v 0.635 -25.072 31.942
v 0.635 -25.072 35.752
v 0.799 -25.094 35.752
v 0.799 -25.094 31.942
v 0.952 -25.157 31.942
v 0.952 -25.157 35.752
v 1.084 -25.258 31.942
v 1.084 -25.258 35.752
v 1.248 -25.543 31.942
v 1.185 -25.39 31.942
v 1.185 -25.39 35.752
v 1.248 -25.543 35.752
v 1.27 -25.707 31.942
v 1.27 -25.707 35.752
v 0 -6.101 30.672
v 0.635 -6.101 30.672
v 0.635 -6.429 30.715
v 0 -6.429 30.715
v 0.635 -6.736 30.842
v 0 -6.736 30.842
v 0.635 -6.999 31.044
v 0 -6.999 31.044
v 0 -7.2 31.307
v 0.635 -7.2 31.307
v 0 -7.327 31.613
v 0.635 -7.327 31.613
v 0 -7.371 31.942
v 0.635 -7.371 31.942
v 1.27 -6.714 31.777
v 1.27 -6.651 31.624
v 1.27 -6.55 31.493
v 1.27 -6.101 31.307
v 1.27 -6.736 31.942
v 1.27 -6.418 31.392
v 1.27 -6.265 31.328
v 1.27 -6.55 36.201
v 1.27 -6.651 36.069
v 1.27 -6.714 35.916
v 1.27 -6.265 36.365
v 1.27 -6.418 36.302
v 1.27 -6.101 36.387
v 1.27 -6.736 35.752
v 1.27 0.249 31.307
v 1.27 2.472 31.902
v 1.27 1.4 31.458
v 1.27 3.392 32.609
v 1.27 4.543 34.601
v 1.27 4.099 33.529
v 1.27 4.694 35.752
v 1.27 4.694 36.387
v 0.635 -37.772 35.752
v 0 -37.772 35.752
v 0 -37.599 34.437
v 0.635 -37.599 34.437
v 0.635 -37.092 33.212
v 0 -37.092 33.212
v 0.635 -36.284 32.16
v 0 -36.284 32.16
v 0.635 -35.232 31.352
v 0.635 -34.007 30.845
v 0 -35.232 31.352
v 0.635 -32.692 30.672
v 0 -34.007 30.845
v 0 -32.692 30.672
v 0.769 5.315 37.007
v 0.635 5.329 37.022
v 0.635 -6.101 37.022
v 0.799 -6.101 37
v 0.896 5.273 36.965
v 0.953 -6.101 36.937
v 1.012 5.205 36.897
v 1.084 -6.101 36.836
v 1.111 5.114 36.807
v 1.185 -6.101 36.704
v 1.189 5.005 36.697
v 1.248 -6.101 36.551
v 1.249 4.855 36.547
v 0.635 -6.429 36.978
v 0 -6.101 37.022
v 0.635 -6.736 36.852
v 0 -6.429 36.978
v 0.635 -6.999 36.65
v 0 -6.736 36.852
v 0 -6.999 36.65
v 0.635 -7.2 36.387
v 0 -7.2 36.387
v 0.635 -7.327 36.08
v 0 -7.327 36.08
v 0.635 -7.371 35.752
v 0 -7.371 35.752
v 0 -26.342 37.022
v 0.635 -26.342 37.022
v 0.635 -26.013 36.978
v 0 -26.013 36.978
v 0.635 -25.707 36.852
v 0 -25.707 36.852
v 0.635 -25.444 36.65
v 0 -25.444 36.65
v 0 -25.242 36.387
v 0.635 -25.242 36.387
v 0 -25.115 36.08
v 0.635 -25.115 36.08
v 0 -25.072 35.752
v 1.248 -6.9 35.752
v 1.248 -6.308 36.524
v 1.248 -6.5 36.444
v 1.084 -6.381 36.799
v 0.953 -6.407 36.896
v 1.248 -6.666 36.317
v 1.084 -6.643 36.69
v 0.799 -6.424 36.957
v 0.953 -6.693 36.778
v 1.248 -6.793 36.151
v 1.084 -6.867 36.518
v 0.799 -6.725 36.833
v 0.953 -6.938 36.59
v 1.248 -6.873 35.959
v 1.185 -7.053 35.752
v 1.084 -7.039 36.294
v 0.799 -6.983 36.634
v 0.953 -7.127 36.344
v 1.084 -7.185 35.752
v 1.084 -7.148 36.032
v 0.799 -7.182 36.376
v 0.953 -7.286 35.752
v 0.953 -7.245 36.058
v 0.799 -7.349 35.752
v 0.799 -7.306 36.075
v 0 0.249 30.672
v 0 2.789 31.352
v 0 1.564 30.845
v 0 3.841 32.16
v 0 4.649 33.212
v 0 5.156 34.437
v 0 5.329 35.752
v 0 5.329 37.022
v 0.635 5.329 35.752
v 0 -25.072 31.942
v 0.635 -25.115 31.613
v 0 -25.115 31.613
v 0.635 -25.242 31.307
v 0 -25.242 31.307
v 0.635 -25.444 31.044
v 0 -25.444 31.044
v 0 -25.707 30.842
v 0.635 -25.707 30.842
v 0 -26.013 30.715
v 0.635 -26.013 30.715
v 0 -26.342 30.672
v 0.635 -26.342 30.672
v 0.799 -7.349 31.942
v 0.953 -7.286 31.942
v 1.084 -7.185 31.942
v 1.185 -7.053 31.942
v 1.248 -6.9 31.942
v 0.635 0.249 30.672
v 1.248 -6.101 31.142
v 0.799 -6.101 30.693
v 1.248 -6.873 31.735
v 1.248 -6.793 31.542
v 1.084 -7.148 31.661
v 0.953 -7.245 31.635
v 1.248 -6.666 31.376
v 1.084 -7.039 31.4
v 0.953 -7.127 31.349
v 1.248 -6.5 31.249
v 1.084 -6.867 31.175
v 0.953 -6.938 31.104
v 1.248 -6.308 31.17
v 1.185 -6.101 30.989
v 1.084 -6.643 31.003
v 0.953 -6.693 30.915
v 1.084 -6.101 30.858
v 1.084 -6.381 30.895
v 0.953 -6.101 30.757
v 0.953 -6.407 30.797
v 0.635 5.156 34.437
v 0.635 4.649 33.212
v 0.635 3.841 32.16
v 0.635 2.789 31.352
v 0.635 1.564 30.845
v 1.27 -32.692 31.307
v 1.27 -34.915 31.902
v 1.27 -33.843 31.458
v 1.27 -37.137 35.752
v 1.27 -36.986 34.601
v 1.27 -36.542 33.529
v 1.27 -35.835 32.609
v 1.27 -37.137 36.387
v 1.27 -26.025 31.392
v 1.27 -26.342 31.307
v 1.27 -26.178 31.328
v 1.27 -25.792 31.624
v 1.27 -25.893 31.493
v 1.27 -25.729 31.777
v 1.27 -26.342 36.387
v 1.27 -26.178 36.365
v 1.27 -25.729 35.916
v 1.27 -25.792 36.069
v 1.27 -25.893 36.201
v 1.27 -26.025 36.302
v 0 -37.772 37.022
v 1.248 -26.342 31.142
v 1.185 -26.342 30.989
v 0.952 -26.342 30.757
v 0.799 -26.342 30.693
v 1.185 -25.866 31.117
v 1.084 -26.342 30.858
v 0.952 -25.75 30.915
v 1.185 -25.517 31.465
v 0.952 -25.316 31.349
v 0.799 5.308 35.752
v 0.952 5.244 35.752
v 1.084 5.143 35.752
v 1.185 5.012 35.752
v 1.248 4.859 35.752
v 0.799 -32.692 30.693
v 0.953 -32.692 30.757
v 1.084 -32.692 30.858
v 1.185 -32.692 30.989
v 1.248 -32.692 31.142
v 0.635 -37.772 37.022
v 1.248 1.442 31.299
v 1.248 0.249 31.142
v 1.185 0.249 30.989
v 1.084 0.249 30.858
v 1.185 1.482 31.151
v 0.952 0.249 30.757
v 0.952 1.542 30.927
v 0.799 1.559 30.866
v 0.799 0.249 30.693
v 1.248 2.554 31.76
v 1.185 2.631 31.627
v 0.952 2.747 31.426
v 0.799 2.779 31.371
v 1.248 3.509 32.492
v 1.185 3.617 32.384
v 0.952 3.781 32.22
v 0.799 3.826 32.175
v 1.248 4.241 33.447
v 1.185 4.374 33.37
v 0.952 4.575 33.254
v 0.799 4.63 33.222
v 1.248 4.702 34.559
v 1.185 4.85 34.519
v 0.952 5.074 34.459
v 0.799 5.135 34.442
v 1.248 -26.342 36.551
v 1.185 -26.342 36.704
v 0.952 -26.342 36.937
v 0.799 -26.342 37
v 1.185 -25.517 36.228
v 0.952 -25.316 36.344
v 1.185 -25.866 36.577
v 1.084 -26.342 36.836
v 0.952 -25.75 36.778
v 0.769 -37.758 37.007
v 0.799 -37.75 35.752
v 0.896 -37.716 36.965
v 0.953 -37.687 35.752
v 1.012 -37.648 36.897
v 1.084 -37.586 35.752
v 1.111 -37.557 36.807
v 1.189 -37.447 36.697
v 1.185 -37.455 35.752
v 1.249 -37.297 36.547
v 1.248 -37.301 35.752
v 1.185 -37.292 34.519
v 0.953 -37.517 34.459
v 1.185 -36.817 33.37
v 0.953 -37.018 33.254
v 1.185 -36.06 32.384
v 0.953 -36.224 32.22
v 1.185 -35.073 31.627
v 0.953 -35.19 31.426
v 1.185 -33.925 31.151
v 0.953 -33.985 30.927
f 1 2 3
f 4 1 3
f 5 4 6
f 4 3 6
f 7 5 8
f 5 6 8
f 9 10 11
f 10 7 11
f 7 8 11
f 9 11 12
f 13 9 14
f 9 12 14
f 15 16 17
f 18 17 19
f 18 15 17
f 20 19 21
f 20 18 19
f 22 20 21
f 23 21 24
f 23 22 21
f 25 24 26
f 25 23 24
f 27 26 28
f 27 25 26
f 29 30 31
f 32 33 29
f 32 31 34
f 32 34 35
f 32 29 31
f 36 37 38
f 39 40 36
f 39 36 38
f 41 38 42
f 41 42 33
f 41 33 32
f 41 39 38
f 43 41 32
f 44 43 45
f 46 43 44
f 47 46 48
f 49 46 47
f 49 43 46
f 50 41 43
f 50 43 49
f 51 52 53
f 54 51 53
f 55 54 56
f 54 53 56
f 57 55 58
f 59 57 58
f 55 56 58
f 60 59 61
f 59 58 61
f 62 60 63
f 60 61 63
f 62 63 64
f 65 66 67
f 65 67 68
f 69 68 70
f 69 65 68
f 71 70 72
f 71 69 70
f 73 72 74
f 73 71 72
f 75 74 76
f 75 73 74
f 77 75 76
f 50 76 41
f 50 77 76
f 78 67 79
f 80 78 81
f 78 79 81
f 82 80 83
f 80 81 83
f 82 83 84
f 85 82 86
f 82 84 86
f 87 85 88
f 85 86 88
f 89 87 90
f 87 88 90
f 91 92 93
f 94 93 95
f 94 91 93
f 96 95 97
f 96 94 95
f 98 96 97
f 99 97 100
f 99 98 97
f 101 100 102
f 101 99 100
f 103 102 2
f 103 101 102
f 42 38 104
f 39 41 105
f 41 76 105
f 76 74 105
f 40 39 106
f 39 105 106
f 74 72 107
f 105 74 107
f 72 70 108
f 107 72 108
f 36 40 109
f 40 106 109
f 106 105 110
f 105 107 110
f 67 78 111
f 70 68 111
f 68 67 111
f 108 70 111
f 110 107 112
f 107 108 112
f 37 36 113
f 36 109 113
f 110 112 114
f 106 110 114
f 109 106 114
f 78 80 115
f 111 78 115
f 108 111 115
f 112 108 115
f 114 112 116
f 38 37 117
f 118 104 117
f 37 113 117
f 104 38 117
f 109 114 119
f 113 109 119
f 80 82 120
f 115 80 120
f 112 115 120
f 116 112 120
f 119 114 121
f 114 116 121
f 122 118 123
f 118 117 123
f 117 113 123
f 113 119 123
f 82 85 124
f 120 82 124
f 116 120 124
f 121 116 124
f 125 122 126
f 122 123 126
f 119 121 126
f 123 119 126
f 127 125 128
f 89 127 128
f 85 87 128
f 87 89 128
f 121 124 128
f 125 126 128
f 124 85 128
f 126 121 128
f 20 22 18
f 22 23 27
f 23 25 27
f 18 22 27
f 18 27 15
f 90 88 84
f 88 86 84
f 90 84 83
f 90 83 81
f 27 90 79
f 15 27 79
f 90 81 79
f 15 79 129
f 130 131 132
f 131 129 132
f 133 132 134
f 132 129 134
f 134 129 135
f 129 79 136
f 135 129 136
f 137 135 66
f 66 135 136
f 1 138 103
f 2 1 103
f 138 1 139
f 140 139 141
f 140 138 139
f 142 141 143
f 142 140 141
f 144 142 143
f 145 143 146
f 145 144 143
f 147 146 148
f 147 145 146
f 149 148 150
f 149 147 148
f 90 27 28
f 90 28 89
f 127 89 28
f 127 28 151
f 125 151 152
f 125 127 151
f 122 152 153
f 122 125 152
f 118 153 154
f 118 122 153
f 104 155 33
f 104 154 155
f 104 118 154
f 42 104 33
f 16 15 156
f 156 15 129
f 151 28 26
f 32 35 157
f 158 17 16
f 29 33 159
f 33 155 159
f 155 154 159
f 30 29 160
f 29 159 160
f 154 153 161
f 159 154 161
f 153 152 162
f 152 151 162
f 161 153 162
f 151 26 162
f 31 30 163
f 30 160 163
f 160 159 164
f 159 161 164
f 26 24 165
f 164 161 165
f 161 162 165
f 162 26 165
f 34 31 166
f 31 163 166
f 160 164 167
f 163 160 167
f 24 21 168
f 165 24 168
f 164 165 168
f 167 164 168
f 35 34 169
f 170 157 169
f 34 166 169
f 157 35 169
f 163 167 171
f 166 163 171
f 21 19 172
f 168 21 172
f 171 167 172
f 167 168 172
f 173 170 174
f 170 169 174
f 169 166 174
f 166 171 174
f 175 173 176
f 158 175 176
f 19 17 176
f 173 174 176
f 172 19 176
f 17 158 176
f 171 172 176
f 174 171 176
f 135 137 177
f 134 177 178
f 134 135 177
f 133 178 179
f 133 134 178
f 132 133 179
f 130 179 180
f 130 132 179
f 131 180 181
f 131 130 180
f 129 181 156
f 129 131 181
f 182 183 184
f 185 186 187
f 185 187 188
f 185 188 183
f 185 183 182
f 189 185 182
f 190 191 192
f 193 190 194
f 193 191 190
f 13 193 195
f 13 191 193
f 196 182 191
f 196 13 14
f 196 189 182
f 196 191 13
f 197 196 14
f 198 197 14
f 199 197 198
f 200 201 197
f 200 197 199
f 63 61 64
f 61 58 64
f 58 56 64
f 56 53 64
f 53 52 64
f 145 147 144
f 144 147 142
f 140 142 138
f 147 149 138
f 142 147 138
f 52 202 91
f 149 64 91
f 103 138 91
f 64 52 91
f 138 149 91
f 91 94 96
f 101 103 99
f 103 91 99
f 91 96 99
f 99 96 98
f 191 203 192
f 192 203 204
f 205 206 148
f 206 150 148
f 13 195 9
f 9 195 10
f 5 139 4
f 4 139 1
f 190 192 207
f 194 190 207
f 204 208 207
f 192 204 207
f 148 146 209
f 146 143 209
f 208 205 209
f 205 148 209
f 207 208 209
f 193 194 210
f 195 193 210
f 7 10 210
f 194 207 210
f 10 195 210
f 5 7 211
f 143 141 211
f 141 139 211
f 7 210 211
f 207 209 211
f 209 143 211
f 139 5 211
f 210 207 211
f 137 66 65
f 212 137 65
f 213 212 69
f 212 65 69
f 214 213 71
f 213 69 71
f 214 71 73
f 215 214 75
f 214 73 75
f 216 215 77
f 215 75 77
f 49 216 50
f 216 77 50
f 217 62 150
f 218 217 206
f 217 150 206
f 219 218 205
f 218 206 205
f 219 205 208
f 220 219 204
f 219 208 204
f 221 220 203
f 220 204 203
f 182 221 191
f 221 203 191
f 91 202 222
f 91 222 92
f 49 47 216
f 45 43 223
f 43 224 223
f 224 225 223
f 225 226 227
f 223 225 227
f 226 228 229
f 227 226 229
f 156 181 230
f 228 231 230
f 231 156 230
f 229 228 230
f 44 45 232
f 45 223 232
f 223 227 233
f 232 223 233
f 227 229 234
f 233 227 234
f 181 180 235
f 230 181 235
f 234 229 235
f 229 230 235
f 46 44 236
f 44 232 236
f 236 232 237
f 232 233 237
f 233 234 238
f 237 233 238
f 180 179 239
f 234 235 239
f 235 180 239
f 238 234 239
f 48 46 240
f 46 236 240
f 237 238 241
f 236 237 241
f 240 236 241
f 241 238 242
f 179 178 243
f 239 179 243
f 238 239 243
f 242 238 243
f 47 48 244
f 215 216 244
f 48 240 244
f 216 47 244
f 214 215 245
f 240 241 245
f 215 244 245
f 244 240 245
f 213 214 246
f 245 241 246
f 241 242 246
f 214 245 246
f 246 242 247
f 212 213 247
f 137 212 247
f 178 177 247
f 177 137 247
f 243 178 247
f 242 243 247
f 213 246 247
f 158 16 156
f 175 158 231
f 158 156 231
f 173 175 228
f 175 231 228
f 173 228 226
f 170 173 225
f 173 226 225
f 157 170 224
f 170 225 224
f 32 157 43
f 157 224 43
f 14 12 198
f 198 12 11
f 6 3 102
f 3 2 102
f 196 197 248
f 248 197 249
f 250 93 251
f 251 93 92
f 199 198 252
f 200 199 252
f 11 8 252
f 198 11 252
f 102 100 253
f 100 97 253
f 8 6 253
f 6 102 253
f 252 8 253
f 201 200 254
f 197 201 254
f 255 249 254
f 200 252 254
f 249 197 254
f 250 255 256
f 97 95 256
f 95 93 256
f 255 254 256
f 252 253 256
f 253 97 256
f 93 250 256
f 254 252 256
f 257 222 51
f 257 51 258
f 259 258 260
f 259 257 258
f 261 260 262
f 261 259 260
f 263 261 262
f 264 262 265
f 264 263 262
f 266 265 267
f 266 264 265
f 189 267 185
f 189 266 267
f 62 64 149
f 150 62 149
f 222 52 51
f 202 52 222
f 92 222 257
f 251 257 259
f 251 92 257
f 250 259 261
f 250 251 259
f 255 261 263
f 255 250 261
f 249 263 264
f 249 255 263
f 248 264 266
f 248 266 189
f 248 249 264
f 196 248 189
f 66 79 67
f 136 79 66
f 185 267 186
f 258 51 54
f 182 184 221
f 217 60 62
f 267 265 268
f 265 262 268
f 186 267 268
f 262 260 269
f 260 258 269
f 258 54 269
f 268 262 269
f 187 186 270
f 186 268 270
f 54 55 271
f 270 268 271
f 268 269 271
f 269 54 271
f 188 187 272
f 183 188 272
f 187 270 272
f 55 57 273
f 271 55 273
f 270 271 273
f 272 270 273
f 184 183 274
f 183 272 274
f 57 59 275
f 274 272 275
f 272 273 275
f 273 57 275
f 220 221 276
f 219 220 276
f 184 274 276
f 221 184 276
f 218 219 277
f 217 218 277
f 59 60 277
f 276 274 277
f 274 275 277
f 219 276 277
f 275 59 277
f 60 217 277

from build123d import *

# Parameters (mm, degrees)
F0_W        = 12.7
F0_H        = 6.35
F1_DEPTH    = 1.27
F2_R        = 0.635
F2_2_R      = 0.635
F3_T1_DEPTH = 13.97
F3_T4_ANGLE = 90
F4_T1_DEPTH = 13.97
F4_T4_ANGLE = 90
F5_T1_DEPTH = 4.445
F5_T4_ANGLE = 90
F6_T1_DEPTH = 4.445
F6_T4_ANGLE = 90
F7_T1_DEPTH = 4.445
F7_T4_ANGLE = 90
F8_T1_DEPTH = 4.445
F8_T4_ANGLE = 90


# Not quite as in the source:
# - a fillet or chamfer that OpenCascade refuses, or shapes differently, is made with other operations: its cross-section is extruded or revolved along the edge and cut away or added


with BuildPart() as f1:
    # F0 (on Right) → F1 (new body)
    with BuildSketch(Plane.YZ):
        with Locations((-31.4221102744, 33.8466549292)):
            Rectangle(F0_W, F0_H)
    extrude(amount=F1_DEPTH)

    # F2
    f2_edges = [f1.edges().sort_by_distance(p)[0] for p in [
        (1.27, -31.42211, 37.021655),
        (1.27, -25.07211, 33.846655),
        (1.27, -31.42211, 30.671655),
        (1.27, -37.77211, 33.846655),
    ]]
    fillet(f2_edges, radius=F2_R)

    # F4: fillet of radius 5.08 on 1 edges, made by hand

    # F4_s2 → F4_t1 (cut)
    with BuildSketch(Plane.YZ.offset(-12.7)):
        with BuildLine():
            ThreePointArc((-37.7721102744, 35.7516549292), (-36.2842127229, 32.1595524808), (-32.6921102744, 30.6716549292))
            Line((-32.6921102744, 30.6716549292), (-37.7721102744, 30.6716549292))
            Line((-37.7721102744, 30.6716549292), (-37.7721102744, 35.7516549292))
        make_face()
    extrude(amount=F4_T1_DEPTH, mode=Mode.SUBTRACT)

    # F4_s3 → F4_t4 (revolve, cut)
    with BuildSketch(Plane.XY.offset(35.7516549292)):
        with BuildLine():
            ThreePointArc((1.27, -37.1371102744), (1.0840128061, -37.5861230805), (0.635, -37.7721102744))
            Line((0.635, -37.7721102744), (1.27, -37.7721102744))
            Line((1.27, -37.7721102744), (1.27, -37.1371102744))
        make_face()
    revolve(axis=Axis((1.27, -32.6921102744, 35.7516549292), (1, 0, 0)), revolution_arc=F4_T4_ANGLE, mode=Mode.SUBTRACT)

    # F5: fillet of radius 1.27 on 1 edges, made by hand

    # F5_s2 → F5_t1 (cut)
    with BuildSketch(Plane.YZ.offset(-3.175)):
        with BuildLine():
            ThreePointArc((-26.3421102744, 37.0216549292), (-25.4440846623, 36.6496805413), (-25.0721102744, 35.7516549292))
            Line((-25.0721102744, 35.7516549292), (-25.0721102744, 37.0216549292))
            Line((-25.0721102744, 37.0216549292), (-26.3421102744, 37.0216549292))
        make_face()
    extrude(amount=F5_T1_DEPTH, mode=Mode.SUBTRACT)

    # F5_s3 → F5_t4 (revolve, cut)
    with BuildSketch(Plane.XY.offset(35.7516549292)):
        with BuildLine():
            ThreePointArc((1.27, -25.7071102744), (1.0840128061, -25.2580974684), (0.635, -25.0721102744))
            Line((0.635, -25.0721102744), (1.27, -25.0721102744))
            Line((1.27, -25.0721102744), (1.27, -25.7071102744))
        make_face()
    revolve(axis=Axis((1.27, -26.3421102744, 35.7516549292), (1, 0, 0)), revolution_arc=F5_T4_ANGLE, mode=Mode.SUBTRACT)

    # F7: fillet of radius 1.27 on 1 edges, made by hand

    # F7_s2 → F7_t1 (cut)
    with BuildSketch(Plane.YZ.offset(-3.175)):
        with BuildLine():
            ThreePointArc((-25.0721102744, 31.9416549292), (-25.4440846623, 31.0436293171), (-26.3421102744, 30.6716549292))
            Line((-26.3421102744, 30.6716549292), (-25.0721102744, 30.6716549292))
            Line((-25.0721102744, 30.6716549292), (-25.0721102744, 31.9416549292))
        make_face()
    extrude(amount=F7_T1_DEPTH, mode=Mode.SUBTRACT)

    # F7_s3 → F7_t4 (revolve, cut)
    with BuildSketch(Plane.XZ.offset(26.3421102744)):
        with BuildLine():
            ThreePointArc((1.27, 31.3066549292), (1.0840128061, 30.8576421232), (0.635, 30.6716549292))
            Line((0.635, 30.6716549292), (1.27, 30.6716549292))
            Line((1.27, 30.6716549292), (1.27, 31.3066549292))
        make_face()
    revolve(axis=Axis((1.27, -26.3421102744, 31.9416549292), (1, 0, 0)), revolution_arc=F7_T4_ANGLE, mode=Mode.SUBTRACT)


with BuildPart() as f1b:
    # F0 (on Right) → F1, piece 2 (new body)
    with BuildSketch(Plane.YZ):
        with Locations((-1.0206177063, 33.8466549292)):
            Rectangle(F0_W, F0_H)
    extrude(amount=F1_DEPTH)

    # F2#2
    f2_2_edges = [f1b.edges().sort_by_distance(p)[0] for p in [
        (1.27, -1.020618, 37.021655),
        (1.27, -7.370618, 33.846655),
        (1.27, -1.020618, 30.671655),
        (1.27, 5.329382, 33.846655),
    ]]
    fillet(f2_2_edges, radius=F2_2_R)

    # F3: fillet of radius 5.08 on 1 edges, made by hand

    # F3_s2 → F3_t1 (cut)
    with BuildSketch(Plane.YZ.offset(-12.7)):
        with BuildLine():
            ThreePointArc((5.3293822937, 35.7516549292), (3.8414847421, 32.1595524808), (0.2493822937, 30.6716549292))
            Line((0.2493822937, 30.6716549292), (5.3293822937, 30.6716549292))
            Line((5.3293822937, 30.6716549292), (5.3293822937, 35.7516549292))
        make_face()
    extrude(amount=F3_T1_DEPTH, mode=Mode.SUBTRACT)

    # F3_s3 → F3_t4 (revolve, cut)
    with BuildSketch(Plane.XZ.offset(-0.2493822937)):
        with BuildLine():
            ThreePointArc((1.27, 31.3066549292), (1.0840128061, 30.8576421232), (0.635, 30.6716549292))
            Line((0.635, 30.6716549292), (1.27, 30.6716549292))
            Line((1.27, 30.6716549292), (1.27, 31.3066549292))
        make_face()
    revolve(axis=Axis((1.27, 0.2493822937, 35.7516549292), (1, 0, 0)), revolution_arc=F3_T4_ANGLE, mode=Mode.SUBTRACT)

    # F6: fillet of radius 1.27 on 1 edges, made by hand

    # F6_s2 → F6_t1 (cut)
    with BuildSketch(Plane.YZ.offset(-3.175)):
        with BuildLine():
            ThreePointArc((-6.1006177063, 37.0216549292), (-6.9986433184, 36.6496805413), (-7.3706177063, 35.7516549292))
            Line((-7.3706177063, 35.7516549292), (-7.3706177063, 37.0216549292))
            Line((-7.3706177063, 37.0216549292), (-6.1006177063, 37.0216549292))
        make_face()
    extrude(amount=F6_T1_DEPTH, mode=Mode.SUBTRACT)

    # F6_s3 → F6_t4 (revolve, cut)
    with BuildSketch(Plane.XZ.offset(6.1006177063)):
        with BuildLine():
            ThreePointArc((1.27, 36.3866549292), (1.0840128061, 36.8356677353), (0.635, 37.0216549292))
            Line((0.635, 37.0216549292), (1.27, 37.0216549292))
            Line((1.27, 37.0216549292), (1.27, 36.3866549292))
        make_face()
    revolve(axis=Axis((1.27, -6.1006177063, 35.7516549292), (1, 0, 0)), revolution_arc=F6_T4_ANGLE, mode=Mode.SUBTRACT)

    # F8: fillet of radius 1.27 on 1 edges, made by hand

    # F8_s2 → F8_t1 (cut)
    with BuildSketch(Plane.YZ.offset(-3.175)):
        with BuildLine():
            ThreePointArc((-6.1006177063, 30.6716549292), (-6.9986433184, 31.0436293171), (-7.3706177063, 31.9416549292))
            Line((-7.3706177063, 31.9416549292), (-7.3706177063, 30.6716549292))
            Line((-7.3706177063, 30.6716549292), (-6.1006177063, 30.6716549292))
        make_face()
    extrude(amount=F8_T1_DEPTH, mode=Mode.SUBTRACT)

    # F8_s3 → F8_t4 (revolve, cut)
    with BuildSketch(Plane.XY.offset(31.9416549292)):
        with BuildLine():
            ThreePointArc((1.27, -6.7356177063), (1.0840128061, -7.1846305124), (0.635, -7.3706177063))
            Line((0.635, -7.3706177063), (1.27, -7.3706177063))
            Line((1.27, -7.3706177063), (1.27, -6.7356177063))
        make_face()
    revolve(axis=Axis((1.27, -6.1006177063, 31.9416549292), (1, 0, 0)), revolution_arc=F8_T4_ANGLE, mode=Mode.SUBTRACT)


solid = Compound([f1.part, f1b.part])
